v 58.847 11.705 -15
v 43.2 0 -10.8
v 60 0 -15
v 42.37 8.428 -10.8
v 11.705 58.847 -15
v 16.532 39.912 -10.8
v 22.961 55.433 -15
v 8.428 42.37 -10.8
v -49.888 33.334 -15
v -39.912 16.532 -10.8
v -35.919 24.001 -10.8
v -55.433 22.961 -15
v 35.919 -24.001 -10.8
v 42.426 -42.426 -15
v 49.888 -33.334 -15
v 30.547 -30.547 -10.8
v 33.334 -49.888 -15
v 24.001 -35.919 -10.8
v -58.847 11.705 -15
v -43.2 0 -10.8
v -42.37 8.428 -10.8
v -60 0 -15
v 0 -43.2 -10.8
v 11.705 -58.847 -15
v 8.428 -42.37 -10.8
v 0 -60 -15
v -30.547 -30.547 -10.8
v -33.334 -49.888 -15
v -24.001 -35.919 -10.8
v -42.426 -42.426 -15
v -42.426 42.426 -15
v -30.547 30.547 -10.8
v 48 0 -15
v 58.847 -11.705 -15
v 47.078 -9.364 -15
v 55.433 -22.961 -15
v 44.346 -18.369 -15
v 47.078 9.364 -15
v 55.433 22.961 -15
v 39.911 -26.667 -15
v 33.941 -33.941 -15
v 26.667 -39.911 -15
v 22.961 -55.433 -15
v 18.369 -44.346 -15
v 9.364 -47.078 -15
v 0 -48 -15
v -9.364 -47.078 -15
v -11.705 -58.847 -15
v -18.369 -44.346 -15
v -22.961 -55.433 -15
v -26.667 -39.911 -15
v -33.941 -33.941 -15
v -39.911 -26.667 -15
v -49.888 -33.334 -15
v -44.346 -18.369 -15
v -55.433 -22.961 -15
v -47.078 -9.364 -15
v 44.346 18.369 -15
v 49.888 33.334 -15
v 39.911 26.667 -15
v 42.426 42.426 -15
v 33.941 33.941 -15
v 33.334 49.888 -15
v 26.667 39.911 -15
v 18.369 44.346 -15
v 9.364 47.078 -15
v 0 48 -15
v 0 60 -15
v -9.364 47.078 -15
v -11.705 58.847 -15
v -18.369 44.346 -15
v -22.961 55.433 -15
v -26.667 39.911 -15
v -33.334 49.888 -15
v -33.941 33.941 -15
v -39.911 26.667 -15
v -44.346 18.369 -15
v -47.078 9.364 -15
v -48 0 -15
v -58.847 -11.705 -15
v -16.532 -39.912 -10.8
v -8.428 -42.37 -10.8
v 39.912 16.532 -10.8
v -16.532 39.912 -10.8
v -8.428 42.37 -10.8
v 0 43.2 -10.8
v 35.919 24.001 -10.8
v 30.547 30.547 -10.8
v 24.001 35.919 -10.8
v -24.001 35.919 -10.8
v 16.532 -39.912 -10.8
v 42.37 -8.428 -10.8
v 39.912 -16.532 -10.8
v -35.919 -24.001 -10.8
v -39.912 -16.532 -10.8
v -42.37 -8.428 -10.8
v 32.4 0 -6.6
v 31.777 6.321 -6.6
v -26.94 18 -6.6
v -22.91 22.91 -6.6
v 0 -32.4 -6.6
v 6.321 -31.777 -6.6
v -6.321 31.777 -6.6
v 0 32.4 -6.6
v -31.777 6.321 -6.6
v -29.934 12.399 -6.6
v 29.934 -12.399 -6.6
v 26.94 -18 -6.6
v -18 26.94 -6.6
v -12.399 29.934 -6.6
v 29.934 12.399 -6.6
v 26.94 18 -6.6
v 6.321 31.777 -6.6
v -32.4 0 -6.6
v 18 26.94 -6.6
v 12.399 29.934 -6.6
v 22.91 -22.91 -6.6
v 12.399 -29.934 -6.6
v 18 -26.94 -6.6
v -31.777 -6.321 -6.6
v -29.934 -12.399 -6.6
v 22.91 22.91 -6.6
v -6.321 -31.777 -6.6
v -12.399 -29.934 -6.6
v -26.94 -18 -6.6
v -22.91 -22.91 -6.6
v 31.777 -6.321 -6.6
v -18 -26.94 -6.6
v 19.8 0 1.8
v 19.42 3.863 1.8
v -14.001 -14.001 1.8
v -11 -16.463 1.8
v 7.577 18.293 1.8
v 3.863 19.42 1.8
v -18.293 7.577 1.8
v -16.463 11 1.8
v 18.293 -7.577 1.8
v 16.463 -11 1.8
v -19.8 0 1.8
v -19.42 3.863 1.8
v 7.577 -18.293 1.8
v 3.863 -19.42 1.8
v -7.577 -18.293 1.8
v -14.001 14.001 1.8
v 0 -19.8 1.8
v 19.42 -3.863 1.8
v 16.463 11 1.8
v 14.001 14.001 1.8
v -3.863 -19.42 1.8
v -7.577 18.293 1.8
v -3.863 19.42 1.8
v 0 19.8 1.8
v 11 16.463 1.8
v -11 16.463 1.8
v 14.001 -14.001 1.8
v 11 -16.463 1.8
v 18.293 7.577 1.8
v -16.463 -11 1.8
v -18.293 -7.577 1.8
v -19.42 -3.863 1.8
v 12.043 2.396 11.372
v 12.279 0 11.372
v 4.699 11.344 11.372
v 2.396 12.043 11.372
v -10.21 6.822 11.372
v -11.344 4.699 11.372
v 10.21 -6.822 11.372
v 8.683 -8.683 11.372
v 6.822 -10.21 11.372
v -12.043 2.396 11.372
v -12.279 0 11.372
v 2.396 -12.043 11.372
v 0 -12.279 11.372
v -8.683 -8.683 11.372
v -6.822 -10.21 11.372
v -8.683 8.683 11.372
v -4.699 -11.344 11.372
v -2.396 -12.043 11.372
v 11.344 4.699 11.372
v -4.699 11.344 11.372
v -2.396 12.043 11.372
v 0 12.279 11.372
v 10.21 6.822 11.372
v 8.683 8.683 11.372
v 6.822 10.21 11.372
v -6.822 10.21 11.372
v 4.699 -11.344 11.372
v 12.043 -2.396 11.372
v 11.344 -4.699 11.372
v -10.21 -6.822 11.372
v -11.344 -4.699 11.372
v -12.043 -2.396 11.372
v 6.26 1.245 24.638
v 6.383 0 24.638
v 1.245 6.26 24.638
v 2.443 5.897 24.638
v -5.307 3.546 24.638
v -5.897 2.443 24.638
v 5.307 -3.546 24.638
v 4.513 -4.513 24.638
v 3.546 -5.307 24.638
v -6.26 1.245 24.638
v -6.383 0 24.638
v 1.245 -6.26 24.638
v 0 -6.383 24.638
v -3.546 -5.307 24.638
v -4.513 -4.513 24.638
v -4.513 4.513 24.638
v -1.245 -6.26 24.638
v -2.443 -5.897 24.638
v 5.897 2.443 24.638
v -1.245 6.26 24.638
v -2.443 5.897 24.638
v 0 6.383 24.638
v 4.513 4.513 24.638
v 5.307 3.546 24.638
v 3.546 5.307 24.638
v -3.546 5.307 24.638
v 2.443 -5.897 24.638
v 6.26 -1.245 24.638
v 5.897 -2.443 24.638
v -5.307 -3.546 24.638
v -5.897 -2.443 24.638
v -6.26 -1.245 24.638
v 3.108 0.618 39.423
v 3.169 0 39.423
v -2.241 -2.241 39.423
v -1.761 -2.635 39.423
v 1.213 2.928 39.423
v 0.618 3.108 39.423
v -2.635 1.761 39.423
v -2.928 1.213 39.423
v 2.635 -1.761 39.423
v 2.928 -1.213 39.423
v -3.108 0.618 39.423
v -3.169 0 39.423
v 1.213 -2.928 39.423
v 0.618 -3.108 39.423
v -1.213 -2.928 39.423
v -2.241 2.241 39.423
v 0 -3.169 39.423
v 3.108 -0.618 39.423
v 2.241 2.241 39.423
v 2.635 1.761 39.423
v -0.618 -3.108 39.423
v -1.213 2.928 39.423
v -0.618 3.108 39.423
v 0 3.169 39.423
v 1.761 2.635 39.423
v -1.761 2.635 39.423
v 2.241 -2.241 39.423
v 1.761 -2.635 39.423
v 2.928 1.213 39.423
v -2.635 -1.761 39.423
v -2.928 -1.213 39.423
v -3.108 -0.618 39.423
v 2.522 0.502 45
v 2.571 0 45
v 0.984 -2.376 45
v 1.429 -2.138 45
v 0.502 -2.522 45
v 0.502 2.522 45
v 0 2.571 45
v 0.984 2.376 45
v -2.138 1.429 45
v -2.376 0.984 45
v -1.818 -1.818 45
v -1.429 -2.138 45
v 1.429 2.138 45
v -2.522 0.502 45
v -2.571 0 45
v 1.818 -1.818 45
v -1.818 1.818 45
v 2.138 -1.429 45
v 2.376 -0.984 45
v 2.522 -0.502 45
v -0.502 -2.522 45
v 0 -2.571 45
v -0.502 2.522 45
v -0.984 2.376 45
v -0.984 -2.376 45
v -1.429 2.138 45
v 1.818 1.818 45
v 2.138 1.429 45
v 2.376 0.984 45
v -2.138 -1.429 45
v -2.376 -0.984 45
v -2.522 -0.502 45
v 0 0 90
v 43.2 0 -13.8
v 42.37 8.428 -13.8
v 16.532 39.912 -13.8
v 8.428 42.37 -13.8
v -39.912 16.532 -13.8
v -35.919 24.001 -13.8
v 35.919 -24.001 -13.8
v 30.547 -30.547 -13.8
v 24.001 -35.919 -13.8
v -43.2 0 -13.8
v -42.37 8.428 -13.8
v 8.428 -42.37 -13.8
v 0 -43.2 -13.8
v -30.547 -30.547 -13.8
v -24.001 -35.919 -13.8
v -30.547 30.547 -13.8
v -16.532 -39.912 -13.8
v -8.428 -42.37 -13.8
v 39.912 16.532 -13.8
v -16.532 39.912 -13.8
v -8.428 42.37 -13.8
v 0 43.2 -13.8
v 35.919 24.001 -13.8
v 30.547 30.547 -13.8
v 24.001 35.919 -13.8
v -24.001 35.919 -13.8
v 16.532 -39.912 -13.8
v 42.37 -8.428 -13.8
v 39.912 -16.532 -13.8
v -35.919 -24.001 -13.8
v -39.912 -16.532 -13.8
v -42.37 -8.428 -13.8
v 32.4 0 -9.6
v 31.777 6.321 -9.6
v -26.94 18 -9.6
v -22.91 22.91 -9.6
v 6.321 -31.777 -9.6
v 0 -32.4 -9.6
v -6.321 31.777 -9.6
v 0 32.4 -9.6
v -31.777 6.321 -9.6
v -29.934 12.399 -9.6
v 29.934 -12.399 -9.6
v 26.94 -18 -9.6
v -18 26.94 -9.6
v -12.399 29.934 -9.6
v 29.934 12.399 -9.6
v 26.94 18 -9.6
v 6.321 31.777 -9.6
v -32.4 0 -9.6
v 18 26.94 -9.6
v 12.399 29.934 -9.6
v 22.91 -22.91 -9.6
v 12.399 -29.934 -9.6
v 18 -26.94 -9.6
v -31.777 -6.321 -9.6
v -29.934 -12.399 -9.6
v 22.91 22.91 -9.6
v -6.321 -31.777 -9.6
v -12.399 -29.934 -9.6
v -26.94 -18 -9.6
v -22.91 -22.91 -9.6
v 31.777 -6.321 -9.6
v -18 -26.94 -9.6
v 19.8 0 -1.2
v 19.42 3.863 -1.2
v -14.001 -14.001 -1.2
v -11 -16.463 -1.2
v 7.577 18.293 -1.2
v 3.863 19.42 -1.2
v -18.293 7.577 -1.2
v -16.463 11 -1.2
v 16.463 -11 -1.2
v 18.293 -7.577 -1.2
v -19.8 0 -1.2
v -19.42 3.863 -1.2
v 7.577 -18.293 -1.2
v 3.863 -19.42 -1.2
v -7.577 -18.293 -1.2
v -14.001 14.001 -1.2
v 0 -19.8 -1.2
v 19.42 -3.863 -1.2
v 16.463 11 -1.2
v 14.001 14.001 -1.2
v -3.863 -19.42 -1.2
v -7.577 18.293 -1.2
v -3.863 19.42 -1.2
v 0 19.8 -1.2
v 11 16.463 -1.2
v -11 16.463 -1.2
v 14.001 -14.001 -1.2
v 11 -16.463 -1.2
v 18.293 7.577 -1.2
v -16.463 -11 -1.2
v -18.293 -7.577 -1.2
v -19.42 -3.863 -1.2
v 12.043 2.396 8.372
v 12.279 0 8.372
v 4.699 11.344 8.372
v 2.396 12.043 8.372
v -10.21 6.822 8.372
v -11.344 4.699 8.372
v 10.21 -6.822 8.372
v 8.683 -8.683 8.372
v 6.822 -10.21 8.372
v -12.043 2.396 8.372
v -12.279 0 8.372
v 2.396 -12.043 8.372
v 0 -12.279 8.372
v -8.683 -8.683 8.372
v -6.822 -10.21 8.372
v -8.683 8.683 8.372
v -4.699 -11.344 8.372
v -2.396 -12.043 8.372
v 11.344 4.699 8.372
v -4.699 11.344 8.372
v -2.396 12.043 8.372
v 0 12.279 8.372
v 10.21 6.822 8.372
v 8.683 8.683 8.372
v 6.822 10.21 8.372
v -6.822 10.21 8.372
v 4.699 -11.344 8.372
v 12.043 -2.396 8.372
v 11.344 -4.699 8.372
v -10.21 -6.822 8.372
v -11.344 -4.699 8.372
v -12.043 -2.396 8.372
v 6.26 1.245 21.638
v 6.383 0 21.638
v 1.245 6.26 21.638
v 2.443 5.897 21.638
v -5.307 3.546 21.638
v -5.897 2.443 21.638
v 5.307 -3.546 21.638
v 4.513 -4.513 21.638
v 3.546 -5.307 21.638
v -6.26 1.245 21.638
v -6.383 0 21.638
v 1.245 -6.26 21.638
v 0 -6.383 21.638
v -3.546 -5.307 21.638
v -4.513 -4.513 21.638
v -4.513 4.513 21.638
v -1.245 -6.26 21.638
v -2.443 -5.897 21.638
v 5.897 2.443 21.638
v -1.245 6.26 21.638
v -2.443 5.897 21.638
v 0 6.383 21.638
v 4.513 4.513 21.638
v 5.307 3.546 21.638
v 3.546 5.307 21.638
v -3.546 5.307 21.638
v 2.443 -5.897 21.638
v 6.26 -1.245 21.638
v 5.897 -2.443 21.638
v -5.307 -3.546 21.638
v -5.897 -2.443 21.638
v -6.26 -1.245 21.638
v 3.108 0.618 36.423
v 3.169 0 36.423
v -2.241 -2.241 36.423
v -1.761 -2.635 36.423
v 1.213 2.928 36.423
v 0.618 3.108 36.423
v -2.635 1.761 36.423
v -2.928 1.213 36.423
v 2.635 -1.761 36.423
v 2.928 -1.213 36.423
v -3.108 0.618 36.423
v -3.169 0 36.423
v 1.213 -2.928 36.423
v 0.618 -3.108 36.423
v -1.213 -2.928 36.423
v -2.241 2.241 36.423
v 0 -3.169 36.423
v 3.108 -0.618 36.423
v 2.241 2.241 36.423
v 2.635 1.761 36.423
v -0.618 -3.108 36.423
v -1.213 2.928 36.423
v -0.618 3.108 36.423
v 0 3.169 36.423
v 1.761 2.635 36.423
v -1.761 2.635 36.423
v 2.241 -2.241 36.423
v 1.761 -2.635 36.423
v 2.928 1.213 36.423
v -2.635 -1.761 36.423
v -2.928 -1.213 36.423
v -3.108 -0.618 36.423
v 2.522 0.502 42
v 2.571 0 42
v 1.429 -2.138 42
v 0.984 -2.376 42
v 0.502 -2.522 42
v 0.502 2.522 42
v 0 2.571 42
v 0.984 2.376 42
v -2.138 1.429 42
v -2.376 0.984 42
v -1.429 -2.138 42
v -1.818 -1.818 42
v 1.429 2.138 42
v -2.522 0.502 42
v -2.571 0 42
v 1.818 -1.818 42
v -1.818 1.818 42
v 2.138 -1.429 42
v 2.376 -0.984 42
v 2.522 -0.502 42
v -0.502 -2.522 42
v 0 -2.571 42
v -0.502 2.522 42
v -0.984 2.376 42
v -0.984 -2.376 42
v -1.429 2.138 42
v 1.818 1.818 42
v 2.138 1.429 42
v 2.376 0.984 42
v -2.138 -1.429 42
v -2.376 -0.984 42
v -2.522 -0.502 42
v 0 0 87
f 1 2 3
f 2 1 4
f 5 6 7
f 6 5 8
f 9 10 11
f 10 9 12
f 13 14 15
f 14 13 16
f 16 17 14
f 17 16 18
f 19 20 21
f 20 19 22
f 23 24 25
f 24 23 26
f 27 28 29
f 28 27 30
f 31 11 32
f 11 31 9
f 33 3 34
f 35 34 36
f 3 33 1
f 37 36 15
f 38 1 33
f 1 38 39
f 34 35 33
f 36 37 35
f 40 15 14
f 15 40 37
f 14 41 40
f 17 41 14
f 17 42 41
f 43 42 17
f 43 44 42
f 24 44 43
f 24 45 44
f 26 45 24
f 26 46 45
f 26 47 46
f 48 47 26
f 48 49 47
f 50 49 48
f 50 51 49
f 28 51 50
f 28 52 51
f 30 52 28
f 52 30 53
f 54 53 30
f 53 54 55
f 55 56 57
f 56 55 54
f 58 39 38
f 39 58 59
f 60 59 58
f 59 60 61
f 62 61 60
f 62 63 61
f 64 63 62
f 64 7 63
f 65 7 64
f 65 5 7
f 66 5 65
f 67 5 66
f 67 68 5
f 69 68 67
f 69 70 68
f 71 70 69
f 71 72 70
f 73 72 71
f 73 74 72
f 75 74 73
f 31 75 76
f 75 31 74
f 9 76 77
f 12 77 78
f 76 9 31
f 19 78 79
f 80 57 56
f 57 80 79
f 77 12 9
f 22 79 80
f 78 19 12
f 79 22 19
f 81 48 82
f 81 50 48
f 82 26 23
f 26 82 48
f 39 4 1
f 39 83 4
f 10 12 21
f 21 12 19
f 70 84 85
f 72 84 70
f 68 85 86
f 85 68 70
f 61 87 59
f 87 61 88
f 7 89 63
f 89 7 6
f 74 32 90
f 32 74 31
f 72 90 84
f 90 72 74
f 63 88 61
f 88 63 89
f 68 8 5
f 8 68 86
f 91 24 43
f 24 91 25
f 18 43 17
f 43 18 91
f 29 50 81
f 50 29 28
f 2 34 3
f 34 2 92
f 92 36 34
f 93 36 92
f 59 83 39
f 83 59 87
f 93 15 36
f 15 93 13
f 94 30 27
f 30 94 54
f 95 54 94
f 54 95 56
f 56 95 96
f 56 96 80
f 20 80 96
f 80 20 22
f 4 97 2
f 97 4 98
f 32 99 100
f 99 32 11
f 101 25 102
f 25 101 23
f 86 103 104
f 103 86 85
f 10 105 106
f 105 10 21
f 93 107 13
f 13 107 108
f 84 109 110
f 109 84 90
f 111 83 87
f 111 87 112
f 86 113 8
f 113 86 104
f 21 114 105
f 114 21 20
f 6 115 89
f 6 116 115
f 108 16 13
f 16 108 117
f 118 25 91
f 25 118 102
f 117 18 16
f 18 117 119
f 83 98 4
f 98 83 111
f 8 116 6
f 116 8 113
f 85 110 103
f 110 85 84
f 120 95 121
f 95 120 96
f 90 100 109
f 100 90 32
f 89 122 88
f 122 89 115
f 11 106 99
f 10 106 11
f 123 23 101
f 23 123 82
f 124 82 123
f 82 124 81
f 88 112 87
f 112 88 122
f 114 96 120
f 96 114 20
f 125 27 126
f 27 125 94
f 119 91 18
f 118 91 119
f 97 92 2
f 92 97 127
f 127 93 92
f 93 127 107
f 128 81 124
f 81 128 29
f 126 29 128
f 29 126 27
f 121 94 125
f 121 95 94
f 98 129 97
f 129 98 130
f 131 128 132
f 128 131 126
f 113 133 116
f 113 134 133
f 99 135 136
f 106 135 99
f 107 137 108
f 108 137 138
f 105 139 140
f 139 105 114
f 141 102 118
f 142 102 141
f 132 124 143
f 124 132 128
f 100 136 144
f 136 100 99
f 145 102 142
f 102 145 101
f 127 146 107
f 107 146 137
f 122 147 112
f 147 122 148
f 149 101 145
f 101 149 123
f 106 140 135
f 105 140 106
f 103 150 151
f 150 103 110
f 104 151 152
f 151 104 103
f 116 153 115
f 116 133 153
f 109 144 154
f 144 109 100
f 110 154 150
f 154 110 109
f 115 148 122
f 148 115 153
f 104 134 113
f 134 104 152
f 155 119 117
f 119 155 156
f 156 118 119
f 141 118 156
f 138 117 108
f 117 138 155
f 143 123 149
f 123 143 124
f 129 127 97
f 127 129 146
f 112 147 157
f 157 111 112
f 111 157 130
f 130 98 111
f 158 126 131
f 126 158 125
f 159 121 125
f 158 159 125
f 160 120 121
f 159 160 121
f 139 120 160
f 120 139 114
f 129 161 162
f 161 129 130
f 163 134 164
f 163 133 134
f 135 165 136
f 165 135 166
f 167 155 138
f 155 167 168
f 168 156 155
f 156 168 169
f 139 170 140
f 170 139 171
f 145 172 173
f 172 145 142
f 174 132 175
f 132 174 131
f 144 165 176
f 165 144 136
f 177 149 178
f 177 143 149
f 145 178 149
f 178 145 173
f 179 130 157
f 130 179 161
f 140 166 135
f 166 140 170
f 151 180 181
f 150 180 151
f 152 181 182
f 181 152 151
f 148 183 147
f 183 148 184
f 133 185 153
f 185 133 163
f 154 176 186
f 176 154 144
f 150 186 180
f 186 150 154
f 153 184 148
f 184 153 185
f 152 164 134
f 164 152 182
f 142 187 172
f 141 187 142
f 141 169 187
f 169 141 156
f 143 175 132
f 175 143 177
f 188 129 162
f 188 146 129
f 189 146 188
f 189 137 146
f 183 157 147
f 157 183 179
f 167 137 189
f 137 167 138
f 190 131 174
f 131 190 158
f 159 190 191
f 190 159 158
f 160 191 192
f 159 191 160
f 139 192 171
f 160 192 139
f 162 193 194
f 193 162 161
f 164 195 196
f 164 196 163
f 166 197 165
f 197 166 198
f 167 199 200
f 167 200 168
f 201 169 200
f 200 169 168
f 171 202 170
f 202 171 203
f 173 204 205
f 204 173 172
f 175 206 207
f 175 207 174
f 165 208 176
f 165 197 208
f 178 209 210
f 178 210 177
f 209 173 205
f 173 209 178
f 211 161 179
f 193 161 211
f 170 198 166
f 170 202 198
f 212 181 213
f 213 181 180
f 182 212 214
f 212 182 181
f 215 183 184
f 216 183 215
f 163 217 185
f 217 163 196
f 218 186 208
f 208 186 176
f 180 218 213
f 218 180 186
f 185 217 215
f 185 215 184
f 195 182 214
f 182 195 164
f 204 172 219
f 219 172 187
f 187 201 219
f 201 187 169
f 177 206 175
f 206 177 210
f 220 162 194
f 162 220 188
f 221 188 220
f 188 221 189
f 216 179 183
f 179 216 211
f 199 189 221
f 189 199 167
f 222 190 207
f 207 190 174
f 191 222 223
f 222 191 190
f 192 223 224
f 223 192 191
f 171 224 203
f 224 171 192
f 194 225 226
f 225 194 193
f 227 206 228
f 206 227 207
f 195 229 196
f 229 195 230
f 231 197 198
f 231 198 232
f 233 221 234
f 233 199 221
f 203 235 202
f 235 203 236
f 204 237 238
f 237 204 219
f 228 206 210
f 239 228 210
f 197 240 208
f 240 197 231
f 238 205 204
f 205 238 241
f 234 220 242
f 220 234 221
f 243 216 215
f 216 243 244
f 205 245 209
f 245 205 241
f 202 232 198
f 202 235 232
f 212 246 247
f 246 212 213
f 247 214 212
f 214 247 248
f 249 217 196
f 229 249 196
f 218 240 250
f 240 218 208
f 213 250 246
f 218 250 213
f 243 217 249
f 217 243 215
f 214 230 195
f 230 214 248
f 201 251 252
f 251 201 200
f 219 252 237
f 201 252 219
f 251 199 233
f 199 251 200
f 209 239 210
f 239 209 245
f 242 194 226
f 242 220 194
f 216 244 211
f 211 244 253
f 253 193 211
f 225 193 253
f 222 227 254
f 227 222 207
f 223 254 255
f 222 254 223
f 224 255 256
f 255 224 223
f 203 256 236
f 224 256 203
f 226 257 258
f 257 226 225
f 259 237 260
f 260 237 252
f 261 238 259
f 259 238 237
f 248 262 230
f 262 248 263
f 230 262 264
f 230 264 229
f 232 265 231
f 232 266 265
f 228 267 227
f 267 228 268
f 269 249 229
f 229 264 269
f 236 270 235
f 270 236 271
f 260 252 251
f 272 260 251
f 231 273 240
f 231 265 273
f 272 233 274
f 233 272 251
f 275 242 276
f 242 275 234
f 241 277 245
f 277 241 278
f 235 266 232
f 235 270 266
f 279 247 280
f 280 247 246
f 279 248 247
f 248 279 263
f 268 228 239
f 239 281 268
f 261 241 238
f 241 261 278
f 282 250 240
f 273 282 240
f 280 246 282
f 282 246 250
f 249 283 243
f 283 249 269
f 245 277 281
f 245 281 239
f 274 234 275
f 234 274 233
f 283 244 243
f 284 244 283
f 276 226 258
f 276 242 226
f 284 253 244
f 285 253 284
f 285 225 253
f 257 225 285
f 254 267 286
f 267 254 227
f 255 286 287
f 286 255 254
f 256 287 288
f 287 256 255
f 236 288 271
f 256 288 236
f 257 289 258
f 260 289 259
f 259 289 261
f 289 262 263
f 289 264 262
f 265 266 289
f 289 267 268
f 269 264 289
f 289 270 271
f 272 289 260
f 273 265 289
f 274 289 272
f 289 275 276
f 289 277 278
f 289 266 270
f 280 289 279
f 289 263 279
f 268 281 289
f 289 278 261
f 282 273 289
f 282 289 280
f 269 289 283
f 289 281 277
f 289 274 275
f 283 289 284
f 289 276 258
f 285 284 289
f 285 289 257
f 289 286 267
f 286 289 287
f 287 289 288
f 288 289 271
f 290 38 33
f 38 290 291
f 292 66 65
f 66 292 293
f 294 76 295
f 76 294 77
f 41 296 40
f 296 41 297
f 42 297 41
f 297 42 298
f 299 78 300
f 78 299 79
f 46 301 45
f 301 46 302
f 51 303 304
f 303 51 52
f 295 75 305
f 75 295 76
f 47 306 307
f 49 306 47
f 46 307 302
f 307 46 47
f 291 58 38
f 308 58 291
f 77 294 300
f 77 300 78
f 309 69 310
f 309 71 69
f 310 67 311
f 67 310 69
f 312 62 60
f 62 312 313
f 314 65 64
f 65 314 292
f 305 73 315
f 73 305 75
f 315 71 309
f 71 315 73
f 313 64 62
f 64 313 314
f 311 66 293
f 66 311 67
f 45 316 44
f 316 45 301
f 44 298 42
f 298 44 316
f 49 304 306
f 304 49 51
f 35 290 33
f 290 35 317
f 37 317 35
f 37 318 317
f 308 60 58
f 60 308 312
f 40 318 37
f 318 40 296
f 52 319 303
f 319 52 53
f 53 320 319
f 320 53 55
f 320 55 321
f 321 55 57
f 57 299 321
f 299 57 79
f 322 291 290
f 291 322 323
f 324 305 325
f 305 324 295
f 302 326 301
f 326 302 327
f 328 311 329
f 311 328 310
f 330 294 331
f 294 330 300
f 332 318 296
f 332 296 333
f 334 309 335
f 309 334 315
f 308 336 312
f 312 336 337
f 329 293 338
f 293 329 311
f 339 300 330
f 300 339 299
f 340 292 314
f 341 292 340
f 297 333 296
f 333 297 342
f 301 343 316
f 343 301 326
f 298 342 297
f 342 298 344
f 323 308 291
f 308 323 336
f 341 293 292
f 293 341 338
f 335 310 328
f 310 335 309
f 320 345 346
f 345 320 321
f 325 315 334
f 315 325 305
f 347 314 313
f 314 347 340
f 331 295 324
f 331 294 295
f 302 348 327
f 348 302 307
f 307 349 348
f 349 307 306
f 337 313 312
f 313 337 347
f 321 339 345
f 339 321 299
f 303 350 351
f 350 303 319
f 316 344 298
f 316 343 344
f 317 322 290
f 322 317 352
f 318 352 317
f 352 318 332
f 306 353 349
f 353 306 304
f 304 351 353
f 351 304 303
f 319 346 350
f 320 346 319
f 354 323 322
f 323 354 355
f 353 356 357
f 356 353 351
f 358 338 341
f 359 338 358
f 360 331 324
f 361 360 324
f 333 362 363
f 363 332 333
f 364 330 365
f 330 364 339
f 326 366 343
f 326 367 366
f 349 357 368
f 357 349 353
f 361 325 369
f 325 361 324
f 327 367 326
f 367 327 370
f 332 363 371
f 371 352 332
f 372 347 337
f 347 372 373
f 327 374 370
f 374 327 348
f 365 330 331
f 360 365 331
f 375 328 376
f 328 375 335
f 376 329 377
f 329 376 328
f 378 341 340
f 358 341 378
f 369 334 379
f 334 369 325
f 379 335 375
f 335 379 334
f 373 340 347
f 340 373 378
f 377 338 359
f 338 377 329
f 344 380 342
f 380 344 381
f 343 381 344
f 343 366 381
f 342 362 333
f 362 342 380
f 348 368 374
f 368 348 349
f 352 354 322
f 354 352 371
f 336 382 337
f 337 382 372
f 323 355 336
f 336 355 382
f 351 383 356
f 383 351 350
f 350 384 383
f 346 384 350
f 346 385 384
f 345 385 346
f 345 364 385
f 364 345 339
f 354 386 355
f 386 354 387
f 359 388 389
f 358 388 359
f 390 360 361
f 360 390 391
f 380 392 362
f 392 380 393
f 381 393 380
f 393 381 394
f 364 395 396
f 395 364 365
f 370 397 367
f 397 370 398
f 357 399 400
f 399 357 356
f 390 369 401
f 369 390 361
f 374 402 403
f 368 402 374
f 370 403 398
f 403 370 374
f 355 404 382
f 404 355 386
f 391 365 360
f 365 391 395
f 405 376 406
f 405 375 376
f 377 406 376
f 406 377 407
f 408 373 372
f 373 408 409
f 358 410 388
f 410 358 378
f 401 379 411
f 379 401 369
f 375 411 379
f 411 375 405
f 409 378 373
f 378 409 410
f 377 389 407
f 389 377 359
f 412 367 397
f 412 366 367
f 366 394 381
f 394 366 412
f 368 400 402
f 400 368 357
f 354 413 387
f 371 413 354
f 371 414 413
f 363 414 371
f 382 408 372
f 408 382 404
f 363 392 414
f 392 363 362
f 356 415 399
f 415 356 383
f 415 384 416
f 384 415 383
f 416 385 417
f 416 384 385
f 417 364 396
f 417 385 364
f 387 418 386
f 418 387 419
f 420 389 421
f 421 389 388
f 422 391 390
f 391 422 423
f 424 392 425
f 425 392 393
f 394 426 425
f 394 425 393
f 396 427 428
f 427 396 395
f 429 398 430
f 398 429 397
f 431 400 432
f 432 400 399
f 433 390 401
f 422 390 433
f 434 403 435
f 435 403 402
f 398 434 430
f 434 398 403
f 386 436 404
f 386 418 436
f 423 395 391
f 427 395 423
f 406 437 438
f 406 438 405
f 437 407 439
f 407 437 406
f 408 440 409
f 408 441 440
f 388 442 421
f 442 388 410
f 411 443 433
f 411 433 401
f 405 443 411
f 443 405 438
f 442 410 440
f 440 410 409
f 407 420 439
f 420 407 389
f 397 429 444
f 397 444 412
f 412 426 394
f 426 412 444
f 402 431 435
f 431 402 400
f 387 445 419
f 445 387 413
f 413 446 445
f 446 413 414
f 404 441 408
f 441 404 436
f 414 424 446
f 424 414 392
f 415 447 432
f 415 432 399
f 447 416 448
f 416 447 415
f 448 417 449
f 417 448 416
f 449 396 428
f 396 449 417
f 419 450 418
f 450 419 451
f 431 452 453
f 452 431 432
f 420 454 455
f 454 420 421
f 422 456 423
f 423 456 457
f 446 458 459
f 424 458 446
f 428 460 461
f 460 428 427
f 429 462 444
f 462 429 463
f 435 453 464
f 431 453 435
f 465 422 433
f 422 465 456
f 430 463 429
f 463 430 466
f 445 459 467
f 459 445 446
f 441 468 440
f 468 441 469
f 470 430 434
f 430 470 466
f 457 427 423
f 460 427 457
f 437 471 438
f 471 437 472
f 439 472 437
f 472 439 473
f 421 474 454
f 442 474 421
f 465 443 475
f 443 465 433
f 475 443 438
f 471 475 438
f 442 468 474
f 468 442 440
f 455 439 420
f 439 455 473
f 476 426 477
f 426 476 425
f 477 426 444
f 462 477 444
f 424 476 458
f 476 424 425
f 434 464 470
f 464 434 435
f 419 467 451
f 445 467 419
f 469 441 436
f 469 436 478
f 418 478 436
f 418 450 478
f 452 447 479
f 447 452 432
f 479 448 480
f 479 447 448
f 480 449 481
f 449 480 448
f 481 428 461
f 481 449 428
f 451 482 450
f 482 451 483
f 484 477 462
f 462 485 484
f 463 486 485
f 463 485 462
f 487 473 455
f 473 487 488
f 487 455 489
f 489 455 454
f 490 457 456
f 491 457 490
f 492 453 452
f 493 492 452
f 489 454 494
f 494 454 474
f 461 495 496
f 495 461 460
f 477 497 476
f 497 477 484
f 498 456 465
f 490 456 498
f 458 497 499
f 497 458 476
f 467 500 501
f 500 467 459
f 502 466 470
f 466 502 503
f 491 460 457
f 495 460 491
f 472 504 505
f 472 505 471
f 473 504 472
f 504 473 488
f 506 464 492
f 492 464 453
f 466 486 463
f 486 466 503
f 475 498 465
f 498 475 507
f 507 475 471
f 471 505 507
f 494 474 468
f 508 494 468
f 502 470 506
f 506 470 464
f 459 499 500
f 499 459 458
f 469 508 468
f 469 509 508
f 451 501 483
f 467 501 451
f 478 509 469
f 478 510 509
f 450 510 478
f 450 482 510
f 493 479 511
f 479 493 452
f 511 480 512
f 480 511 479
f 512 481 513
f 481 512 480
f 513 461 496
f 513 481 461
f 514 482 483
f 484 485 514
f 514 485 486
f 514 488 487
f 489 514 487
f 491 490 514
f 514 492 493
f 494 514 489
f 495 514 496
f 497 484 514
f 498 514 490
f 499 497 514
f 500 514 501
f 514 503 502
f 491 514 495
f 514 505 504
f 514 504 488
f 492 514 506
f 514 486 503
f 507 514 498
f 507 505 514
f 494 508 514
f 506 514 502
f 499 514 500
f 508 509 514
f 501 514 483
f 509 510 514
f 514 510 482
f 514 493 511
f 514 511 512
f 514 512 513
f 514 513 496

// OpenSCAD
module cone(height, radius)
{
   /*  difference() { */
        cylinder(h = height, r1 = radius, r2 = 0, center = false);
        /* translate(v = [0, 0, -2])
            cylinder(h = height, r1 = radius, r2 = 0, center = false);
    } */
}

$fn=32;

module wormhole_solid() {
	union() {
	    cone(5,  20);
	    cone(7,  18);
	    cone(10,  15);
	    cone(14,  11);
	    cone(18,  8);
	    cone(23,  5);
	    cone(28,  3);
	    cone(35,  2);
	}
}

module wormhole()
{
	difference() {
		wormhole_solid();
		translate(v = [0, 0, -1])
			wormhole_solid();
	}
}

translate(v = [0, 0, -15])
	scale(v = [3, 3, 3])
		wormhole();
